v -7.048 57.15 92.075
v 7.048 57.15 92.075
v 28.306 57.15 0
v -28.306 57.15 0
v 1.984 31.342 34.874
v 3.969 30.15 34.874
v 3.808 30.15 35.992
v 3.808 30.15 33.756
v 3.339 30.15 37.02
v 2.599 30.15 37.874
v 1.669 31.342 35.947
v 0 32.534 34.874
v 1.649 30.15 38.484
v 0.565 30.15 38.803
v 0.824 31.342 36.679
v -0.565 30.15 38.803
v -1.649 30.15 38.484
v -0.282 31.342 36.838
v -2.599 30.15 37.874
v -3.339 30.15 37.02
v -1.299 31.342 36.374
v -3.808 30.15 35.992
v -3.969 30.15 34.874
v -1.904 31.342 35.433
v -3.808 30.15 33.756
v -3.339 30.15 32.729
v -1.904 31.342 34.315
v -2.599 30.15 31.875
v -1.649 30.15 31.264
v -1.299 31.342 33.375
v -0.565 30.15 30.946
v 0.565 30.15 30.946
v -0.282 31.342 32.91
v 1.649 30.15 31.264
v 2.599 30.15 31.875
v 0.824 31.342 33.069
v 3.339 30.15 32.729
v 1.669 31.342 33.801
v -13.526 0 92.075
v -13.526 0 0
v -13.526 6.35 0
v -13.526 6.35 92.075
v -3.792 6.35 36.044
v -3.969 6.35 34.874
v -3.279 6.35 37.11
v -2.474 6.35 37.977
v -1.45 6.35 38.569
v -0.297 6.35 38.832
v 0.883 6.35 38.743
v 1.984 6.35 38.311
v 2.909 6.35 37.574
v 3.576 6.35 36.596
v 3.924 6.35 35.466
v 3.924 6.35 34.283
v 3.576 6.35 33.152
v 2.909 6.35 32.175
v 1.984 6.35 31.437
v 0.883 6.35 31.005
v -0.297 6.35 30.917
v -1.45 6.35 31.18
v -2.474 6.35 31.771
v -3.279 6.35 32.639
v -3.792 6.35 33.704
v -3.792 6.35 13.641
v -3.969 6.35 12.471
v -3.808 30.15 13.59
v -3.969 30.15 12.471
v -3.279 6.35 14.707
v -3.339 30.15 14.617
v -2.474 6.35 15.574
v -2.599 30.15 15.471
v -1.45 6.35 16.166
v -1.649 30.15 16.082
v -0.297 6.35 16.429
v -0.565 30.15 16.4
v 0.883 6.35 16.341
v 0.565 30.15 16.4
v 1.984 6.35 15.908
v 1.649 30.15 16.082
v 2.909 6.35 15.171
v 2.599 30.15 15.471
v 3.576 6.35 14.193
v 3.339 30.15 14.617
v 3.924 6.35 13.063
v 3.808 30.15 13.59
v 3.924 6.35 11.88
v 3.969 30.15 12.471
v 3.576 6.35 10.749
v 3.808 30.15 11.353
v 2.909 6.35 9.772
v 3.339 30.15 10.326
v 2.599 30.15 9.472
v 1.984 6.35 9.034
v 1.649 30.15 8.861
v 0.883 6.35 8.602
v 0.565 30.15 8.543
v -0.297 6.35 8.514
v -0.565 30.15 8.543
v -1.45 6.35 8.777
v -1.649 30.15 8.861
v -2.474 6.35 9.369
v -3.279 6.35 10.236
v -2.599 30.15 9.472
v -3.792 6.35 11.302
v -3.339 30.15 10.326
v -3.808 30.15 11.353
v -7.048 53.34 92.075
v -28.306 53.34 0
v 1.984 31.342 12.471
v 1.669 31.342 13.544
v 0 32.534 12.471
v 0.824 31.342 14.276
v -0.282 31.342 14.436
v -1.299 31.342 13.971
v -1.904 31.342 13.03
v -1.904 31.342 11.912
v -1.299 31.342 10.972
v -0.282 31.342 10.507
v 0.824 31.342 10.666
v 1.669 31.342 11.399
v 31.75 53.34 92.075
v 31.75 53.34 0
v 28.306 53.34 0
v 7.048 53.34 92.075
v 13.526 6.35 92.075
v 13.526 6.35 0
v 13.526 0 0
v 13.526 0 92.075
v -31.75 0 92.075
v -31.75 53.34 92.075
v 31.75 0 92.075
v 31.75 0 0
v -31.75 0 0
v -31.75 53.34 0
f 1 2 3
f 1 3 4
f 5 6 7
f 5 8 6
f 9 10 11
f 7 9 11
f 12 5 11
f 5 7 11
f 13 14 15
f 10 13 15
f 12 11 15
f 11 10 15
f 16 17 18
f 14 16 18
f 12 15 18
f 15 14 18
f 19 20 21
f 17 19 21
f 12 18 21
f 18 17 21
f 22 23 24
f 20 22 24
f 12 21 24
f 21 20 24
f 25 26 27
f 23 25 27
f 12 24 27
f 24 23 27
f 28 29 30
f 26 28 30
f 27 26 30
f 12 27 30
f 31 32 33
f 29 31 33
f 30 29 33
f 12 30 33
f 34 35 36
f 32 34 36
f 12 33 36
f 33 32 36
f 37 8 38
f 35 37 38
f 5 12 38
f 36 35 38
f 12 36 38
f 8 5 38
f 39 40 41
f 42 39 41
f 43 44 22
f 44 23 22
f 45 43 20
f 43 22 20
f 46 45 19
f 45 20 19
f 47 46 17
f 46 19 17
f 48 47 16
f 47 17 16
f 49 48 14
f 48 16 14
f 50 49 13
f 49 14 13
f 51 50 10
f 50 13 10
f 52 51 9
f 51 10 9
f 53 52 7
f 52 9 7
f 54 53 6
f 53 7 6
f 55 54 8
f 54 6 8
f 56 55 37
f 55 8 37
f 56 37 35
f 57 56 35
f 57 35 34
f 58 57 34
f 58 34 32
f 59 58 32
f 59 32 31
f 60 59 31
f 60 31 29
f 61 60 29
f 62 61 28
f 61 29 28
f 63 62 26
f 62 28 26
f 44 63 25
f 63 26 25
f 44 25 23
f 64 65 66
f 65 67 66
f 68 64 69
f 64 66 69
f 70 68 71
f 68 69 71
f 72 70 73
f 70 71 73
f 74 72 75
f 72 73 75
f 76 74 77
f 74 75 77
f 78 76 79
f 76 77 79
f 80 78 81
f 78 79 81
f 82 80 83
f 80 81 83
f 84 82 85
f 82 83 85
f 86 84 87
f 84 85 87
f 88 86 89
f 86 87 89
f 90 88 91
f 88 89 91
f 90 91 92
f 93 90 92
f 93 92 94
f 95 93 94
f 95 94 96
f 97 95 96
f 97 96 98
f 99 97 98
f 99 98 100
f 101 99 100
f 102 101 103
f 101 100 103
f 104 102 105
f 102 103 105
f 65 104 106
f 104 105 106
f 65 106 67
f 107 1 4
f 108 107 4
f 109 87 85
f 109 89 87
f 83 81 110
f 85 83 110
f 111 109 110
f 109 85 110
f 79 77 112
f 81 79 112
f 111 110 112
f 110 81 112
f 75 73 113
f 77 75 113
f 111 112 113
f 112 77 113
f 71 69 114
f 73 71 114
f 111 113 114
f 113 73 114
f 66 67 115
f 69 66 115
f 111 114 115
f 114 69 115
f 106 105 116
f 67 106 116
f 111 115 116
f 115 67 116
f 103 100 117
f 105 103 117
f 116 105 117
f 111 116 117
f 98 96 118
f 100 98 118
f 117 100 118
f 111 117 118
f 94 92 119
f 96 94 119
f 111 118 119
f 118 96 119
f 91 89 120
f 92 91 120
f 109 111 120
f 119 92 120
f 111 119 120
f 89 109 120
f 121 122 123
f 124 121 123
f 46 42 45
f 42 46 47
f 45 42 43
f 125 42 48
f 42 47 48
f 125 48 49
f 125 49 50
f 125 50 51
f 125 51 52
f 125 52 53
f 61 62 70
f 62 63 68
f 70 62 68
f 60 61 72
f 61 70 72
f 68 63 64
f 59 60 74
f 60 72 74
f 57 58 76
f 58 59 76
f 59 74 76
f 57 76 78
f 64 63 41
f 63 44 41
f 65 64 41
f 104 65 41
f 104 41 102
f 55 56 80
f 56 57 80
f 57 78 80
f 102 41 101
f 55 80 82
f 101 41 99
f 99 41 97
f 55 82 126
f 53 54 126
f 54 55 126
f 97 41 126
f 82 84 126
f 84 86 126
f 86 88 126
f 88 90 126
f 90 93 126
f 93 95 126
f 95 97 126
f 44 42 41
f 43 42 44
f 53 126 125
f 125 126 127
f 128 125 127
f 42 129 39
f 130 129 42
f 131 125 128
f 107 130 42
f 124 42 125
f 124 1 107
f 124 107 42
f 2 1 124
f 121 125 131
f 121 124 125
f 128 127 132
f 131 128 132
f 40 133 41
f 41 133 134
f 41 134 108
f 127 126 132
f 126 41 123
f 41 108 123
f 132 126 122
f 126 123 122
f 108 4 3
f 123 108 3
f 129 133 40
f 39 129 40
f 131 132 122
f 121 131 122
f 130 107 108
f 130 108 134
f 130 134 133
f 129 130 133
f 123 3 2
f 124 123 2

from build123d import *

# Parameters (mm, degrees)
F1_DEPTH = 92.075
F3_D     = 7.9375
F3_DEPTH = 23.7998
F3_TIP   = 2.3846655818
F5_DEPTH = 3.81


with BuildPart() as f1:
    # F0 (on Top) → F1 (new body)
    with BuildSketch(Plane.XY):
        Polygon((-31.75, 57.15), (-31.75, 0), (-13.5255, 0), (-13.5255, 6.35), (13.5255, 6.35), (13.5255, 0), (31.75, 0), (31.75, 57.15), align=None)
    extrude(amount=F1_DEPTH)

    # F3
    with Locations(Plane.XZ.offset(-6.35)):
        with Locations((0, 34.8742), (0, 12.4714)):
            Hole(F3_D / 2, depth=F3_DEPTH)
            with Locations((0, 0, -(F3_DEPTH + F3_TIP / 2))):  # 118° drill point
                Cone(0, F3_D / 2, F3_TIP, mode=Mode.SUBTRACT)

    # F4 (on face) → F5 (cut)
    with BuildSketch(Plane(origin=(0, 57.15, 0), x_dir=(-1, 0, 0), z_dir=(0, 1, 0))):
        Polygon((-31.75, 0), (-28.3056886979, 0), (-7.0485, 92.075), (-31.75, 92.075), align=None)
        Polygon((7.0485, 92.075), (28.3056886979, 0), (31.75, 0), (31.75, 92.075), align=None)
    extrude(amount=-F5_DEPTH, mode=Mode.SUBTRACT)


solid = f1.part
